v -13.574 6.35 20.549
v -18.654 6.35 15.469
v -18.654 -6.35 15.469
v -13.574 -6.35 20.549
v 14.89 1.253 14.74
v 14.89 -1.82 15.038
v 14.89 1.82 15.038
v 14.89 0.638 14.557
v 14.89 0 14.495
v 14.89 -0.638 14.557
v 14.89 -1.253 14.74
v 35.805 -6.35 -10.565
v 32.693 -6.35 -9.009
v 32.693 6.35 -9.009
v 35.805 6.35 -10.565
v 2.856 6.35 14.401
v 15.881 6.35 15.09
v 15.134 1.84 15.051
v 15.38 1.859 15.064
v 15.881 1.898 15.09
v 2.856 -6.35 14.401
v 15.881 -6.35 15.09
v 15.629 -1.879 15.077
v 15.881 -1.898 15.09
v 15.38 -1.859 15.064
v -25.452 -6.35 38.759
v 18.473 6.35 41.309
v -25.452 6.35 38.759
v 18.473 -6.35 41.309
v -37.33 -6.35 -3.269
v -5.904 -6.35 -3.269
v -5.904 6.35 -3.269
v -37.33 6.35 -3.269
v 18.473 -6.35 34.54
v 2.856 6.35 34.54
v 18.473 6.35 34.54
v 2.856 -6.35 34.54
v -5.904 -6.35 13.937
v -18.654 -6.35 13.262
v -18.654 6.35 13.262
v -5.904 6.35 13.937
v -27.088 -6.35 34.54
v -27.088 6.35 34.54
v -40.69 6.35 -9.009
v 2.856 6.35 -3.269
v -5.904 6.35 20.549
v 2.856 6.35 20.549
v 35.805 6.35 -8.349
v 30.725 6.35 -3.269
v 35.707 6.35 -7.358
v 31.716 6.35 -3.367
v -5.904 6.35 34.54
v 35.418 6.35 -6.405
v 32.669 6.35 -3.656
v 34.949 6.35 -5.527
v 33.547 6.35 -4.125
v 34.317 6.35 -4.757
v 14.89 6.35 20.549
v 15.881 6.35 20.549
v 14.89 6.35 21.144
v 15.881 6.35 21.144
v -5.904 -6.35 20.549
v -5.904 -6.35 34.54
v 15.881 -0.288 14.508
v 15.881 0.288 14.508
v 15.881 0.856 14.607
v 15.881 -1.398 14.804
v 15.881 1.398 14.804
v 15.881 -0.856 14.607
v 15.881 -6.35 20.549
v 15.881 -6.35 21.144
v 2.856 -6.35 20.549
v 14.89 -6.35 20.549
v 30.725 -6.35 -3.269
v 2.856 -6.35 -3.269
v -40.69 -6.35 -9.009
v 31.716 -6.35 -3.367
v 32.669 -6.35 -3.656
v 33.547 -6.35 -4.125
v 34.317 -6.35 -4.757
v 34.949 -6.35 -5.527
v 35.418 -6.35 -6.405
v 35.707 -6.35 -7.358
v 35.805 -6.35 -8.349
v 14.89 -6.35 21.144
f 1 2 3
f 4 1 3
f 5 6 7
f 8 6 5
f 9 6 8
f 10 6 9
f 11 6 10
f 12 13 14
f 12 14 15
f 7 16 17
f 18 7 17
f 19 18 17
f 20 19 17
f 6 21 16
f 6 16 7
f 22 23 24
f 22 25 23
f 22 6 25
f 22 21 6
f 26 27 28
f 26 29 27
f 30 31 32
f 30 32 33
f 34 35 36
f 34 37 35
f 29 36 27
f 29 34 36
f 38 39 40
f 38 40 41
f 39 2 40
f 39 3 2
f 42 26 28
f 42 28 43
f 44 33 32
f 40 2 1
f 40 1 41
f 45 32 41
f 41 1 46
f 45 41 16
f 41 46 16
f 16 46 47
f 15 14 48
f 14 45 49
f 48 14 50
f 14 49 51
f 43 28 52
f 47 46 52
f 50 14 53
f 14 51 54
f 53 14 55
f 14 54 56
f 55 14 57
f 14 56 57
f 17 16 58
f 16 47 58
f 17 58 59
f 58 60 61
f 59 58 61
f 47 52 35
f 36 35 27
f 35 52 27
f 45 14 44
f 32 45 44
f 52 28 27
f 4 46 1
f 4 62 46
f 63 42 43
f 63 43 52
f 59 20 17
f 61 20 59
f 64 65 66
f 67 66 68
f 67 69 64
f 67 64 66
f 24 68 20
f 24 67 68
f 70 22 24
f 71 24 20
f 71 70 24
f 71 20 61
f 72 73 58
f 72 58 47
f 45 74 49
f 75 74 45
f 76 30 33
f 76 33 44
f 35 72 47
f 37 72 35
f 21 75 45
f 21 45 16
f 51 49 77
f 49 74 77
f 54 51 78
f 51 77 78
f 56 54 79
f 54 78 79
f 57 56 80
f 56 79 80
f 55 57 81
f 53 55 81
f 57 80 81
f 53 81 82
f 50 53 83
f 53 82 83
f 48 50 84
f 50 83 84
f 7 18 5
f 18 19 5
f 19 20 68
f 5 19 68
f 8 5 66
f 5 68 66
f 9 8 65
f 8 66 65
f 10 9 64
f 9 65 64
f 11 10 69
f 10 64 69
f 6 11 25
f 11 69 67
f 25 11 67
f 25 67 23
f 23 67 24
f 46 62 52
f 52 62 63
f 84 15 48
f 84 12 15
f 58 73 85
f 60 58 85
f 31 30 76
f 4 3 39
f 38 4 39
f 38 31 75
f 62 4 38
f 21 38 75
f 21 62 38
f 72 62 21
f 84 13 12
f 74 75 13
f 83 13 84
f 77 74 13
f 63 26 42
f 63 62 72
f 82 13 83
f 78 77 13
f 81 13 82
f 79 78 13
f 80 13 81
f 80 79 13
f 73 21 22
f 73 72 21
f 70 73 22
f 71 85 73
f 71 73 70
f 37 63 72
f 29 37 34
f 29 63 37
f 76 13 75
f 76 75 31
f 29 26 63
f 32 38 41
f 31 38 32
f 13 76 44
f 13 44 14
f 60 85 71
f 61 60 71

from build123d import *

# Parameters (mm, degrees)
F0_W     = 8.7596660014
F0_H     = 13.9908213168
F0_W_2   = 0.9912690148
F0_H_2   = 0.5951654166
F1_DEPTH = 6.35
F2_R     = 5.08
F4_SIZE  = 5.08


with BuildPart() as f1:
    # F0 (on Front) → F1 (new body, symmetric)
    with BuildSketch(Plane.XZ):
        Polygon((18.4732656926, 41.3089023039), (-25.4520159215, 38.7587957084), (-27.0884726197, 34.5398373902), (-25.4520159215, 34.5398373902), (-5.9040691704, 34.5398373902), (2.8555968311, 34.5398373902), (18.4732656926, 34.5398373902), align=None)
        with Locations((-1.5242361696, 27.5444267318)):
            Rectangle(F0_W, F0_H)
        Polygon((14.8897180334, 20.5490160733), (2.8555968311, 20.5490160733), (2.8555968311, 17.8197465704), (15.8809870481, 17.8197465704), (15.8809870481, 20.5490160733), align=None)
        Polygon((2.8555968311, 17.8197465704), (2.8555968311, 20.5490160733), (-5.9040691704, 20.5490160733), (-5.9040691704, 13.9371497284), (2.8555968311, 14.4008970871), align=None)
        Polygon((-5.9040691704, 13.9371497284), (-5.9040691704, 20.5490160733), (-18.6544265598, 20.5490160733), (-18.6544265598, 13.2621303201), align=None)
        Polygon((15.8809870481, 17.8197465704), (2.8555968311, 17.8197465704), (2.8555968311, 14.4008970871), (15.8809870481, 15.0904770675), align=None)
        with Locations((15.3853525408, 20.8465987816)):
            Rectangle(F0_W_2, F0_H_2)
        Polygon((2.8555968311, 14.4008970871), (-5.9040691704, 13.9371497284), (-5.9040691704, -3.2693331596), (-37.3304970562, -3.2693331596), (-40.6903134995, -9.0090157464), (32.6927527785, -9.0090157464), (35.8047001064, -10.5649875477), (35.8047001064, -3.2693331596), (2.8555968311, -3.2693331596), align=None)
    extrude(amount=F1_DEPTH, both=True)

    # F2
    f2_edges = [f1.edges().sort_by_distance(p)[0] for p in [
        (35.8047, 0, -3.269333),
    ]]
    fillet(f2_edges, radius=F2_R)

    # F0 (on Front) → F3 (revolve)
    with BuildSketch(Plane.XZ):
        with Locations((15.3853525408, 20.8465987816)):
            Rectangle(F0_W_2, F0_H_2)
    revolve(axis=Axis((9.3682919396, 0, 17.8197465704), (-1, 0, 0)))

    # F4
    f4_edges = [f1.edges().sort_by_distance(p)[0] for p in [
        (-18.654427, 0, 20.549016),
    ]]
    chamfer(f4_edges, length=F4_SIZE)


solid = f1.part
